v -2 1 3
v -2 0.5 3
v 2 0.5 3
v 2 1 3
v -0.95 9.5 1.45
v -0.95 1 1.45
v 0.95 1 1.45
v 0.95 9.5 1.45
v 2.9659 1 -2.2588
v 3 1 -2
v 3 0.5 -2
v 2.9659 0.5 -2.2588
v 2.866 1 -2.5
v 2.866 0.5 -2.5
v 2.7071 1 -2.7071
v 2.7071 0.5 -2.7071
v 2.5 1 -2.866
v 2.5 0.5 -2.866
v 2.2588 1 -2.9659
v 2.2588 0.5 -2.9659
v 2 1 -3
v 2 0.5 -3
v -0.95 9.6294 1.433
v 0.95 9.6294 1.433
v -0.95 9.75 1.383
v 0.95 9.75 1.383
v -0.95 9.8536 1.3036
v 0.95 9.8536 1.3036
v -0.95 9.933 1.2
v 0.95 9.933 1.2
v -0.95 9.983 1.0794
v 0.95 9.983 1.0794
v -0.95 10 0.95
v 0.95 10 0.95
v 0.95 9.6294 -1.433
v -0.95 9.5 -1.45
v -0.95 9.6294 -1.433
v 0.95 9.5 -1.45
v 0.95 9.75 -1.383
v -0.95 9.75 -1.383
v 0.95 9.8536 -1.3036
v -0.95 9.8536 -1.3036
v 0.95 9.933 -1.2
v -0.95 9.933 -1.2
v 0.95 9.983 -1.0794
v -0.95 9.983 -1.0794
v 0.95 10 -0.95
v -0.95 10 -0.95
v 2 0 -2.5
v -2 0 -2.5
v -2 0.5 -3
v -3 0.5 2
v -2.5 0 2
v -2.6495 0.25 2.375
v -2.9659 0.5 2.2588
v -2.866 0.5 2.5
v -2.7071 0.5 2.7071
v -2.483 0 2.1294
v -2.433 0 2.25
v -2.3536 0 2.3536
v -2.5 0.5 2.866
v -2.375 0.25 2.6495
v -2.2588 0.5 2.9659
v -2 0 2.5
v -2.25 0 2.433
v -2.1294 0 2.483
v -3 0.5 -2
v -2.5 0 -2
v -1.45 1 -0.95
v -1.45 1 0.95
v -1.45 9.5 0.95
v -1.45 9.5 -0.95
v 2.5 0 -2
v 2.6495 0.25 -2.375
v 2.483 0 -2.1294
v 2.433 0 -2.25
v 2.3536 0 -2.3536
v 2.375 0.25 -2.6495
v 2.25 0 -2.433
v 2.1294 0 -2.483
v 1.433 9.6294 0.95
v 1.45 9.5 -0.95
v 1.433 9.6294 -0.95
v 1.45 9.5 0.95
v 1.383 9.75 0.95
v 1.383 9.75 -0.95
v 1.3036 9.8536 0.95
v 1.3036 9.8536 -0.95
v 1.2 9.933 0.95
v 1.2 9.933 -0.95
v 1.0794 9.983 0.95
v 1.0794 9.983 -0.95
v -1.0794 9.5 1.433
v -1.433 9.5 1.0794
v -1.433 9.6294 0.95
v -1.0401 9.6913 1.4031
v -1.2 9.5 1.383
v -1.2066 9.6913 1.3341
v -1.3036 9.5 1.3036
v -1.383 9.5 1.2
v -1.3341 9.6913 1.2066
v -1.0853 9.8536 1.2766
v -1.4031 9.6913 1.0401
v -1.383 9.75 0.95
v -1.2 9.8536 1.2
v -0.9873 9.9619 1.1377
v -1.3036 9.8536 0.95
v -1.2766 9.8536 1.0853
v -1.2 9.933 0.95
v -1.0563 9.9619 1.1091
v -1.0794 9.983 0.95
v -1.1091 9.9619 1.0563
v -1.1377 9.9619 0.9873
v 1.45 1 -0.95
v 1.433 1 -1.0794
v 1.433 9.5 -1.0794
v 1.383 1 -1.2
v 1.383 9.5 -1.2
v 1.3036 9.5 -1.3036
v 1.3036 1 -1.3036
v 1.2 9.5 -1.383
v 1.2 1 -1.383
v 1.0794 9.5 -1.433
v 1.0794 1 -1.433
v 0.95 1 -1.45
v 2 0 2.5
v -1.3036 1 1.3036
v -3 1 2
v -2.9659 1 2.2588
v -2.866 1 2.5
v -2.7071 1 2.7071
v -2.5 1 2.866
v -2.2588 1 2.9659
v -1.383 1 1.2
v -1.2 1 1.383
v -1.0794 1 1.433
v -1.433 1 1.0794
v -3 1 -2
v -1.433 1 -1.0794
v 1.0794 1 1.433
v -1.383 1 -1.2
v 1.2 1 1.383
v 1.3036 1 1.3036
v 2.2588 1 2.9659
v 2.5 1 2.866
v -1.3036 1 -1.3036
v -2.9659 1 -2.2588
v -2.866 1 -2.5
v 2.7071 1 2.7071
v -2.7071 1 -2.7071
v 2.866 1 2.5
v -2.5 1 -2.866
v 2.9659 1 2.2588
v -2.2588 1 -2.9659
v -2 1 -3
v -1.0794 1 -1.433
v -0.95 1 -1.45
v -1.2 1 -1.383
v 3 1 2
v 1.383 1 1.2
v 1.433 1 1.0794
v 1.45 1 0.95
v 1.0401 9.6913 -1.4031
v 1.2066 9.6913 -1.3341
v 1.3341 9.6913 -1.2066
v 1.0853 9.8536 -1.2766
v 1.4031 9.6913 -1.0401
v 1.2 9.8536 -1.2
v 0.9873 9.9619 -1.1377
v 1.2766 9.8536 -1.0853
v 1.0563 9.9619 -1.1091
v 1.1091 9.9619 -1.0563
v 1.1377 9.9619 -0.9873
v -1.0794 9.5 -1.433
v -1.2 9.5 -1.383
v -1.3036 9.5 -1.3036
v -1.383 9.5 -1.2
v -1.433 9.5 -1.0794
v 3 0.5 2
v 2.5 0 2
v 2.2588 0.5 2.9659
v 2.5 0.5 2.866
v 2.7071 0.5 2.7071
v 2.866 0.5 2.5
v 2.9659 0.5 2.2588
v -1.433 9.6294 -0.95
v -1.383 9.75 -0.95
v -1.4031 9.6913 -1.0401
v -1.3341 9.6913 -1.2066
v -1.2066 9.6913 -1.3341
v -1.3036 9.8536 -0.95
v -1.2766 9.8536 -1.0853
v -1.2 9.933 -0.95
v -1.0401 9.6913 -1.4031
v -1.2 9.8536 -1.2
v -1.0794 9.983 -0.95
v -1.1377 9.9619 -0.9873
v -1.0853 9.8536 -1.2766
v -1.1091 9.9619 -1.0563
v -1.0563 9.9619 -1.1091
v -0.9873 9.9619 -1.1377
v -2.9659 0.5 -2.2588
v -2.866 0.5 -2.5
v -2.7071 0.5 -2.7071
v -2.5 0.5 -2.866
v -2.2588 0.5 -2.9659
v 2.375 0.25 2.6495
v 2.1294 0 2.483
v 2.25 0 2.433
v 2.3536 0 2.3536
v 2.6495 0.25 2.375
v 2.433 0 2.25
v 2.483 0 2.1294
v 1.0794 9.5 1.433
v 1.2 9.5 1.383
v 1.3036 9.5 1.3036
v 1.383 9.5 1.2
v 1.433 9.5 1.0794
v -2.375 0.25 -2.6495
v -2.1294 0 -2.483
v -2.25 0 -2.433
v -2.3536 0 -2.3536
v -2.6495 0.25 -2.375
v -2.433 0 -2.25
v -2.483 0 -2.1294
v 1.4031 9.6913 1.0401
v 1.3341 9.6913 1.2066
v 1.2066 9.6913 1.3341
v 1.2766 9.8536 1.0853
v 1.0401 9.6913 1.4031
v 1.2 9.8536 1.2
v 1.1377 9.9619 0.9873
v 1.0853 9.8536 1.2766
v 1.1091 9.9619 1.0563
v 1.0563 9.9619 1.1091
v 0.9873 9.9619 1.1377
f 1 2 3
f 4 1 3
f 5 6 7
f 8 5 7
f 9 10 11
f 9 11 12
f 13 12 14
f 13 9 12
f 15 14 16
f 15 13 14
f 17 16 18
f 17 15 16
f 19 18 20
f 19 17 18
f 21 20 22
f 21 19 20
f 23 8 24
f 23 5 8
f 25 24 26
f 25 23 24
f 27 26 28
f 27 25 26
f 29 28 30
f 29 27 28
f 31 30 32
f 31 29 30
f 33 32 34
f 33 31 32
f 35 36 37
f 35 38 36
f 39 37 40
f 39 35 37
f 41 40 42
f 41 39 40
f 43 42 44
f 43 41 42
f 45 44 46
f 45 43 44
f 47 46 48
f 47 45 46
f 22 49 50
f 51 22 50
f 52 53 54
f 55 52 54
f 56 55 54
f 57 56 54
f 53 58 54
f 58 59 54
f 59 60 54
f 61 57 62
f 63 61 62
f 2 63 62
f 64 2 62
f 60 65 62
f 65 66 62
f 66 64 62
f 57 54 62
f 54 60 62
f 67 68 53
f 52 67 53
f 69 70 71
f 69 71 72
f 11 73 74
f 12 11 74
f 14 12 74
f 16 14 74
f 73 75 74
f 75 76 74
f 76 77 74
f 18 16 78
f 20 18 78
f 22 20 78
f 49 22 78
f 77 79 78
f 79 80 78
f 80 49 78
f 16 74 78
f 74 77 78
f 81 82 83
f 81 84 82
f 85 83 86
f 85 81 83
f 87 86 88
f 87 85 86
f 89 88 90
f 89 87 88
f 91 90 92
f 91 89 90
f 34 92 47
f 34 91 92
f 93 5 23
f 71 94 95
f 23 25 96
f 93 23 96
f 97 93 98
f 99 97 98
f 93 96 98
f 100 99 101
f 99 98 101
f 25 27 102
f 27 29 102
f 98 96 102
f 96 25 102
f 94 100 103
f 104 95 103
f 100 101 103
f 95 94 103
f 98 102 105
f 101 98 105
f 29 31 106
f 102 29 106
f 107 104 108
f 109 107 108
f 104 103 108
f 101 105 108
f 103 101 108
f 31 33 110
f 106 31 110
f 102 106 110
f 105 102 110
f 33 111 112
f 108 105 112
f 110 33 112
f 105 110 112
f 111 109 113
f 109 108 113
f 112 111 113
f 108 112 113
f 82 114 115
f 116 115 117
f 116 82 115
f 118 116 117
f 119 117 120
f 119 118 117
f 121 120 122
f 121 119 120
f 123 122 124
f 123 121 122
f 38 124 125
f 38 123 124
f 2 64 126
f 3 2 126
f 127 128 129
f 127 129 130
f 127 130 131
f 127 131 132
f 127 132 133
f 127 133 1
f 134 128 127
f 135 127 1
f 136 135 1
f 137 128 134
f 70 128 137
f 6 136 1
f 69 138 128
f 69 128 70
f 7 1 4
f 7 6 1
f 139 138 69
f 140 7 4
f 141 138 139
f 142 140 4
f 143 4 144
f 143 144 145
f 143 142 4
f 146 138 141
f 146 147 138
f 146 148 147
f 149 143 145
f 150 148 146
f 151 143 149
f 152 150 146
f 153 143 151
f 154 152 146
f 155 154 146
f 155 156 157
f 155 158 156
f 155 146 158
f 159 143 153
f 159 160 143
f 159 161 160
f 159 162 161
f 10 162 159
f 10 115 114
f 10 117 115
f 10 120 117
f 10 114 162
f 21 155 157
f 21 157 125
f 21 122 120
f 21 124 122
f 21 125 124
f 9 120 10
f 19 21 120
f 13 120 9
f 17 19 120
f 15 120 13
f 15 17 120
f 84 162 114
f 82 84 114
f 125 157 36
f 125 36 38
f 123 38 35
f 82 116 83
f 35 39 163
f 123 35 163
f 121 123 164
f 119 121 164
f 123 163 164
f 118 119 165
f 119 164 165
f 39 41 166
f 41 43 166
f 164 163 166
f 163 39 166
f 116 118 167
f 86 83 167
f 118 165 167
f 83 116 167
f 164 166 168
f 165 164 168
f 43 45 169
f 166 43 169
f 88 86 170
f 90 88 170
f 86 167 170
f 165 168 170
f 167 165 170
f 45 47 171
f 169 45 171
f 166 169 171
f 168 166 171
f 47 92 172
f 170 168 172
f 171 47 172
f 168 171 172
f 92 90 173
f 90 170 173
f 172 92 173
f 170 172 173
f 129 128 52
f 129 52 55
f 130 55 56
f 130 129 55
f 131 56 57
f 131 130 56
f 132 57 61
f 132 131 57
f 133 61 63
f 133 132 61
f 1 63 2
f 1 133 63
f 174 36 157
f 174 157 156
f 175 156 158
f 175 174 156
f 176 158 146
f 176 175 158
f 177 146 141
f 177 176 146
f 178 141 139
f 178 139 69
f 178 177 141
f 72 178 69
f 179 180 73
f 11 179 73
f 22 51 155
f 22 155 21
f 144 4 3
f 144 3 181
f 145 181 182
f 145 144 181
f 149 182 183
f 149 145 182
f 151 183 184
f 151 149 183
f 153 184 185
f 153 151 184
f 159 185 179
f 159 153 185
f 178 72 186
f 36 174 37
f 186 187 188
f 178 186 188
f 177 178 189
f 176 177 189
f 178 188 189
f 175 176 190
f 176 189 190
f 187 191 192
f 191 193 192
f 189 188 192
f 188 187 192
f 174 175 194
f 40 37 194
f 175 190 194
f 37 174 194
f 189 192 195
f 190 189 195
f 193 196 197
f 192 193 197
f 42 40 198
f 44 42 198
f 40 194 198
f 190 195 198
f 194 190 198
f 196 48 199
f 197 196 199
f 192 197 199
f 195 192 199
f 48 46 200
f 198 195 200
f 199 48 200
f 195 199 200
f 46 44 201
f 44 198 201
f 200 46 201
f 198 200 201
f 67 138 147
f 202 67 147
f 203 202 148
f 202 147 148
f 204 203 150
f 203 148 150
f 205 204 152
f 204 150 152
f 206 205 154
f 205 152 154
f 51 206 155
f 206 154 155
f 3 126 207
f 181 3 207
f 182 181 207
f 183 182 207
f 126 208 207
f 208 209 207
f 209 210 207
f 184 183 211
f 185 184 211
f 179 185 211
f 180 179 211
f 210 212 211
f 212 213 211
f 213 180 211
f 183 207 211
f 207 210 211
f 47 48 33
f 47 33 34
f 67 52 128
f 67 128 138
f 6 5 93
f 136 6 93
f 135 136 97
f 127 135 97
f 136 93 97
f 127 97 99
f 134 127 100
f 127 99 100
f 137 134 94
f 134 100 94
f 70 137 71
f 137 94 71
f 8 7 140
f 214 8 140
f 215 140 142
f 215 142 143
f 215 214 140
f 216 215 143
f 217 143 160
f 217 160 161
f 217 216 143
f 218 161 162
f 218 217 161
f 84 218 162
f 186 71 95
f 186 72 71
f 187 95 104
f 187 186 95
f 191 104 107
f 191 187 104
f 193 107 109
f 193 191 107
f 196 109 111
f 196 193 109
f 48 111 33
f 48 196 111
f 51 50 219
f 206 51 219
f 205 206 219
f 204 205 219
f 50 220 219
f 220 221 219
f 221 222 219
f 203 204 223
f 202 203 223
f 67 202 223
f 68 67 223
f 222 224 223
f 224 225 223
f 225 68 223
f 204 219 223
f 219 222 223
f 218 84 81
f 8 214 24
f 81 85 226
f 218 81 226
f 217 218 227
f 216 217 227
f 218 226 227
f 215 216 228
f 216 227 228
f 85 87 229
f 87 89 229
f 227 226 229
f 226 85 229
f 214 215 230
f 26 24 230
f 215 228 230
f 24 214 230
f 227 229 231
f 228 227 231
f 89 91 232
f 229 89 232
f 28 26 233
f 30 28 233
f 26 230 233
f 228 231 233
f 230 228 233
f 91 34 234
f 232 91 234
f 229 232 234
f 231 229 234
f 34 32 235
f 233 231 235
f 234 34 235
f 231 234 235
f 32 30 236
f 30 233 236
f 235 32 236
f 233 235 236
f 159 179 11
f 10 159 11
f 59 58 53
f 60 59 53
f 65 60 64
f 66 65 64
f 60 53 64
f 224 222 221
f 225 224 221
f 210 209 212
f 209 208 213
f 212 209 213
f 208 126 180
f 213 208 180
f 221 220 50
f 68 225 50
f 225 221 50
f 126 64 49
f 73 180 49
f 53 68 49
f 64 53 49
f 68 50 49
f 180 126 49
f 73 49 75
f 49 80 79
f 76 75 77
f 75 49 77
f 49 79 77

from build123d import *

# Parameters (mm, degrees)
SKETCH1_W           = 6
SKETCH1_H           = 6
BOSS_EXTRUDE1_DEPTH = 1
FILLET1_R           = 1
SKETCH2_W           = 2.9
SKETCH2_H           = 2.9
BOSS_EXTRUDE2_DEPTH = 9
FILLET2_R           = 0.5
FILLET3_R           = 0.5
CHAMFER1_SIZE       = 0.5


with BuildPart() as part:
    # Sketch1 → Boss-Extrude1 (new body)
    with BuildSketch(Plane(origin=(0, 0, 0), x_dir=(1, 0, 0), z_dir=(0, 1, 0))):
        Rectangle(SKETCH1_W, SKETCH1_H)
    extrude(amount=BOSS_EXTRUDE1_DEPTH)

    # Fillet1
    fillet1_edges = [part.edges().sort_by_distance(p)[0] for p in [
        (3, 0.5, 3),
        (-3, 0.5, 3),
        (-3, 0.5, -3),
        (3, 0.5, -3),
    ]]
    fillet(fillet1_edges, radius=FILLET1_R)

    # Sketch2 → Boss-Extrude2 (add)
    with BuildSketch(Plane(origin=(0, 1, 0), x_dir=(1, 0, 0), z_dir=(0, 1, 0))):
        Rectangle(SKETCH2_W, SKETCH2_H)
    extrude(amount=BOSS_EXTRUDE2_DEPTH)

    # Fillet2
    fillet2_edges = [part.edges().sort_by_distance(p)[0] for p in [
        (1.45, 5.5, 1.45),
        (1.45, 5.5, -1.45),
        (-1.45, 5.5, -1.45),
        (-1.45, 5.5, 1.45),
    ]]
    fillet(fillet2_edges, radius=FILLET2_R)

    # Fillet3
    fillet3_edges = [part.edges().sort_by_distance(p)[0] for p in [
        (0, 10, -1.45),
        (1.45, 10, 0),
        (-1.45, 10, 0),
        (0, 10, 1.45),
        (-1.303553391, 10, 1.303553391),
        (1.303553391, 10, 1.303553391),
        (-1.303553391, 10, -1.303553391),
        (1.303553391, 10, -1.303553391),
    ]]
    fillet(fillet3_edges, radius=FILLET3_R)

    # Chamfer1
    chamfer1_edges = [part.edges().sort_by_distance(p)[0] for p in [
        (0, 0, 3),
        (3, 0, 0),
        (-3, 0, 0),
        (0, 0, -3),
        (2.707106781, 0, 2.707106781),
        (2.707106781, 0, -2.707106781),
        (-2.707106781, 0, -2.707106781),
        (-2.707106781, 0, 2.707106781),
    ]]
    chamfer(chamfer1_edges, length=CHAMFER1_SIZE)


solid = part.part
